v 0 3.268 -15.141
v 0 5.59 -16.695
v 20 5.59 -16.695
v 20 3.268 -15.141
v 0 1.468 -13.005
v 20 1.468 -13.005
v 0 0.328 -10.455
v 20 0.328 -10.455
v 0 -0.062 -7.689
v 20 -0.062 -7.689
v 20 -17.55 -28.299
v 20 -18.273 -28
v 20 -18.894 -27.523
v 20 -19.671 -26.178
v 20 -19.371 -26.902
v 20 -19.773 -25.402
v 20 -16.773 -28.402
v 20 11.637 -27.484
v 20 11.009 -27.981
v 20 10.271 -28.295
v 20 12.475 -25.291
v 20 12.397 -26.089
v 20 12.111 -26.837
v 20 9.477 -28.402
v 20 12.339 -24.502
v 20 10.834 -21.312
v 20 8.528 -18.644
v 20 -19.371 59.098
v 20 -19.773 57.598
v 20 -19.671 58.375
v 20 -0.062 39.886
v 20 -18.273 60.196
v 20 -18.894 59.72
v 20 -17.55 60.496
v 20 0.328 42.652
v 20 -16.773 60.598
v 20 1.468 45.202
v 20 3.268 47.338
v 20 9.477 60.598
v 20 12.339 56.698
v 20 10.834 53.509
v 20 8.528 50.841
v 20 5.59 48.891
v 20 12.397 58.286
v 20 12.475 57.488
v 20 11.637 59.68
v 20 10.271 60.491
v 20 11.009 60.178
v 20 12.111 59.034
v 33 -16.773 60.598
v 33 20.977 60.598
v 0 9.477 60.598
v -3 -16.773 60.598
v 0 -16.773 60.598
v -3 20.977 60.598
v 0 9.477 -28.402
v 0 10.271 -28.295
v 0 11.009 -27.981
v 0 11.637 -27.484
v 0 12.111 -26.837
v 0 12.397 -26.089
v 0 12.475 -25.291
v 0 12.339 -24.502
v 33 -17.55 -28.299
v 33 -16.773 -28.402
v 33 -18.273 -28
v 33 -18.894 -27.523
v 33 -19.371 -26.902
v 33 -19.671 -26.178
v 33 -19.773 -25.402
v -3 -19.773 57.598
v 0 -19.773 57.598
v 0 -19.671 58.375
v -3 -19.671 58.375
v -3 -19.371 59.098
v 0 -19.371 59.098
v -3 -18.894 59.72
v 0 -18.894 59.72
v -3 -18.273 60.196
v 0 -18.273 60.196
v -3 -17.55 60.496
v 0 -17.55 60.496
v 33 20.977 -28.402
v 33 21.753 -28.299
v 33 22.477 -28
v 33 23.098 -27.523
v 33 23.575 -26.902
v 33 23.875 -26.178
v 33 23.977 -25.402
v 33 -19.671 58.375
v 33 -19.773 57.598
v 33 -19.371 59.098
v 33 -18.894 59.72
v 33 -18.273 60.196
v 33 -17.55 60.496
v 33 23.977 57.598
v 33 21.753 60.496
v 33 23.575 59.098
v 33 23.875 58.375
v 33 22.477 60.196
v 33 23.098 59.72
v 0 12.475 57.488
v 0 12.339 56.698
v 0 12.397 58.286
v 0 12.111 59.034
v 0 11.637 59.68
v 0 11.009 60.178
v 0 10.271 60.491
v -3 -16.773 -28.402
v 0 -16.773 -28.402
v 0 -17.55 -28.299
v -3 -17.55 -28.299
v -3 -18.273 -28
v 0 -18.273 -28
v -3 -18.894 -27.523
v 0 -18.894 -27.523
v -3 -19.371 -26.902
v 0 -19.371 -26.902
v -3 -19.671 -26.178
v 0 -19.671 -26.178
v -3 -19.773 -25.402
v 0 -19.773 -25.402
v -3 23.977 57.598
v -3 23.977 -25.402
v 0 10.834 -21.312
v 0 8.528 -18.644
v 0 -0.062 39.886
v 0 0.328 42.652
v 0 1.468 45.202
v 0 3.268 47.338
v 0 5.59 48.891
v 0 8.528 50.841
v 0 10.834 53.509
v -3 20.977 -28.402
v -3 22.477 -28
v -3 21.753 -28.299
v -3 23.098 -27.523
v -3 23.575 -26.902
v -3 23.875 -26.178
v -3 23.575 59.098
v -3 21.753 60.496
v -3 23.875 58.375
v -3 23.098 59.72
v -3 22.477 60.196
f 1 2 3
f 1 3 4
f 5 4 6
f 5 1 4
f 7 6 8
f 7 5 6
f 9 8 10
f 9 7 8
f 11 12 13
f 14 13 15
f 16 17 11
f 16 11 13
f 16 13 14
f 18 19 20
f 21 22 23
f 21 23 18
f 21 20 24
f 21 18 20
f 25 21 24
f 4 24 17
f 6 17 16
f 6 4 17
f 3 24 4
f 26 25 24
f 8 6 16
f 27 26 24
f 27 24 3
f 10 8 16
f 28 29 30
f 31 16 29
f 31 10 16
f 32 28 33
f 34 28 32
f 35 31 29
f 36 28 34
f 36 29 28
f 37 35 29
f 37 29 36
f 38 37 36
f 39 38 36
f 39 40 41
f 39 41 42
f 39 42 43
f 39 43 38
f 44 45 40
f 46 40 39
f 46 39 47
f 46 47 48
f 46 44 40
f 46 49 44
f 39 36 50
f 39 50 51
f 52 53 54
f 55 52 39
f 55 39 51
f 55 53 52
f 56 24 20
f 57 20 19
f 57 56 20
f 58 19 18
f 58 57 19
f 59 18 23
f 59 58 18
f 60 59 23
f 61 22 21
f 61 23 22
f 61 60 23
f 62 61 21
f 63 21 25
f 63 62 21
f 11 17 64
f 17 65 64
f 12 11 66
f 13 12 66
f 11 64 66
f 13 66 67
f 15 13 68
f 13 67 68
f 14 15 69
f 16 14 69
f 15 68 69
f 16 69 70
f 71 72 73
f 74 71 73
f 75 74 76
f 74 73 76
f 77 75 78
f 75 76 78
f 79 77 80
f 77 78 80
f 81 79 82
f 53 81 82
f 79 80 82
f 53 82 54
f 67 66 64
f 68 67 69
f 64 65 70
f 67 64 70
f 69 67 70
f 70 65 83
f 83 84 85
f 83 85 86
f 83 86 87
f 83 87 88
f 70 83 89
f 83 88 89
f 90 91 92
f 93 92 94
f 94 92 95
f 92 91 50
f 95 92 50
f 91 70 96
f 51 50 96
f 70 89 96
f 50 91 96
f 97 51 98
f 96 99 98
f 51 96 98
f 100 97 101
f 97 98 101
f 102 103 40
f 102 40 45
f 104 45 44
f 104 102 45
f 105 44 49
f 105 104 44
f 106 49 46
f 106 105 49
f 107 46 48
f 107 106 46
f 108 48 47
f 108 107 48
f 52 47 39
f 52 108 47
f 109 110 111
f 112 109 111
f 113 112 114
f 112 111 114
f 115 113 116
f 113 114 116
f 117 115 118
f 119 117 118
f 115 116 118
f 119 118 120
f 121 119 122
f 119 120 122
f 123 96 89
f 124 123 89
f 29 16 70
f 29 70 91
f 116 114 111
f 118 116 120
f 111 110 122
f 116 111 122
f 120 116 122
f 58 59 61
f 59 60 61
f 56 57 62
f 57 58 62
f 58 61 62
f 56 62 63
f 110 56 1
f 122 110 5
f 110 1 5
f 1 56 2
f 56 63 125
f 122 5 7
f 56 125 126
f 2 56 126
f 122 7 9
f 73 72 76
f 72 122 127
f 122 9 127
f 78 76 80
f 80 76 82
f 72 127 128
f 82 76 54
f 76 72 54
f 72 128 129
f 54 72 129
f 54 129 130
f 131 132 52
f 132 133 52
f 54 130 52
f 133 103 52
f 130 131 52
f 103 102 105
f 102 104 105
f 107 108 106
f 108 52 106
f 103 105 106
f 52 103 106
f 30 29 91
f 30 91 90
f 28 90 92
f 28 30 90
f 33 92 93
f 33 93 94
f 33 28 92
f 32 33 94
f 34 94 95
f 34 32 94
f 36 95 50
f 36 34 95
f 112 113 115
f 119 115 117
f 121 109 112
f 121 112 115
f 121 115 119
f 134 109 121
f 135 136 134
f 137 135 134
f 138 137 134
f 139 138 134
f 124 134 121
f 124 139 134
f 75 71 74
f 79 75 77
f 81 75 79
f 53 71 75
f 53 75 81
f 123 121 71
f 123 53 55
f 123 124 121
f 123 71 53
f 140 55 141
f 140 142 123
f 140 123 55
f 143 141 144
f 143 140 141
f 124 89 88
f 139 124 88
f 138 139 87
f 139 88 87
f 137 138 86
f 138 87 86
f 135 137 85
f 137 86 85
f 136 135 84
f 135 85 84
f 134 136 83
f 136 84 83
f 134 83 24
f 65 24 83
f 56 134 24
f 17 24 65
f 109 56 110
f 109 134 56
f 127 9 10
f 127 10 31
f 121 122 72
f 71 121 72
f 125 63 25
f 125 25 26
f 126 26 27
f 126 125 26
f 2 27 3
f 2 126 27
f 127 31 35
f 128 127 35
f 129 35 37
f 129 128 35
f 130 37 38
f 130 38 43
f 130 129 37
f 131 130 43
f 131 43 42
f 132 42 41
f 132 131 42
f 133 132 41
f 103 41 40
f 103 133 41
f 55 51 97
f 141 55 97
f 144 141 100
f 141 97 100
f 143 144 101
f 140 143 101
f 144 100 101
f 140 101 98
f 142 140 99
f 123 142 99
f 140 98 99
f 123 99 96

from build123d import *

# Parameters (mm, degrees)
RESSALTO_EXTRUS_O2_DEPTH      = 30
RESSALTO_EXTRUS_O3_DEPTH      = 3
RESSALTO_EXTRUS_O4_DEPTH      = 3
RESSALTO_EXTRUS_O4_DEPTH_BACK = 10


with BuildPart() as part:
    # Esboço2 → Ressalto-extrusão2 (new body)
    with BuildSketch(Plane(origin=(0, 0, 0), x_dir=(0, 0, -1), z_dir=(1, 0, 0))):
        with BuildLine():
            Line((2.90159992, -0.062465938), (-35.09840008, -0.062465938))
            Line((-35.09840008, -0.062465938), (-39.886084903, -0.062465938))
            ThreePointArc((-39.886084903, -0.062465938), (-45.202180234, 1.467638524), (-48.891439328, 5.589707975))
            ThreePointArc((-48.891439328, 5.589707975), (-52.096536948, 9.772081499), (-56.69840008, 12.338743681))
            ThreePointArc((-56.69840008, 12.338743681), (-59.373224015, 11.895603401), (-60.59840008, 9.476926077))
            Line((-60.59840008, 9.476926077), (-60.59840008, 20.976926077))
            ThreePointArc((-60.59840008, 20.976926077), (-59.719720424, 23.09824642), (-57.59840008, 23.976926077))
            Line((-57.59840008, 23.976926077), (25.40159992, 23.976926077))
            ThreePointArc((25.40159992, 23.976926077), (27.522920263, 23.09824642), (28.40159992, 20.976926077))
            Line((28.40159992, 20.976926077), (28.40159992, 9.476926077))
            ThreePointArc((28.40159992, 9.476926077), (27.176423855, 11.895603401), (24.50159992, 12.338743681))
            ThreePointArc((24.50159992, 12.338743681), (19.899736788, 9.772081499), (16.694639168, 5.589707975))
            ThreePointArc((16.694639168, 5.589707975), (13.005380073, 1.467638524), (7.689284743, -0.062465938))
            Line((7.689284743, -0.062465938), (2.90159992, -0.062465938))
        make_face()
    extrude(amount=RESSALTO_EXTRUS_O2_DEPTH)

    # Esboço3 → Ressalto-extrusão3 (add)
    with BuildSketch(Plane.ZY):
        with BuildLine():
            Line((60.59840008, 15.226926077), (60.59840008, 20.976926077))
            ThreePointArc((60.59840008, 20.976926077), (59.719720424, 23.09824642), (57.59840008, 23.976926077))
            Line((57.59840008, 23.976926077), (16.09840008, 23.976926077))
            Line((16.09840008, 23.976926077), (-25.40159992, 23.976926077))
            ThreePointArc((-25.40159992, 23.976926077), (-27.522920263, 23.09824642), (-28.40159992, 20.976926077))
            Line((-28.40159992, 20.976926077), (-28.40159992, 15.226926077))
            Line((-28.40159992, 15.226926077), (-28.40159992, -16.773073923))
            ThreePointArc((-28.40159992, -16.773073923), (-27.522920263, -18.894394267), (-25.40159992, -19.773073923))
            Line((-25.40159992, -19.773073923), (57.59840008, -19.773073923))
            ThreePointArc((57.59840008, -19.773073923), (59.719720424, -18.894394267), (60.59840008, -16.773073923))
            Line((60.59840008, -16.773073923), (60.59840008, 15.226926077))
        make_face()
    extrude(amount=RESSALTO_EXTRUS_O3_DEPTH)

    # Esboço4 → Ressalto-extrusão4 (add, two sides)
    with BuildSketch(Plane(origin=(30, 0, 0), x_dir=(0, 0, -1), z_dir=(1, 0, 0))) as ressalto_extrus_o4_sk:
        with BuildLine():
            Line((-16.09840008, 23.976926077), (25.40159992, 23.976926077))
            ThreePointArc((25.40159992, 23.976926077), (27.522920263, 23.09824642), (28.40159992, 20.976926077))
            Line((28.40159992, 20.976926077), (28.40159992, 15.226926077))
            Line((28.40159992, 15.226926077), (28.40159992, -16.773073923))
            ThreePointArc((28.40159992, -16.773073923), (27.522920263, -18.894394267), (25.40159992, -19.773073923))
            Line((25.40159992, -19.773073923), (-57.59840008, -19.773073923))
            ThreePointArc((-57.59840008, -19.773073923), (-59.719720424, -18.894394267), (-60.59840008, -16.773073923))
            Line((-60.59840008, -16.773073923), (-60.59840008, 15.226926077))
            Line((-60.59840008, 15.226926077), (-60.59840008, 20.976926077))
            ThreePointArc((-60.59840008, 20.976926077), (-59.719720424, 23.09824642), (-57.59840008, 23.976926077))
            Line((-57.59840008, 23.976926077), (-16.09840008, 23.976926077))
        make_face()
    extrude(amount=RESSALTO_EXTRUS_O4_DEPTH)
    extrude(ressalto_extrus_o4_sk.sketch, amount=-RESSALTO_EXTRUS_O4_DEPTH_BACK)


solid = part.part
